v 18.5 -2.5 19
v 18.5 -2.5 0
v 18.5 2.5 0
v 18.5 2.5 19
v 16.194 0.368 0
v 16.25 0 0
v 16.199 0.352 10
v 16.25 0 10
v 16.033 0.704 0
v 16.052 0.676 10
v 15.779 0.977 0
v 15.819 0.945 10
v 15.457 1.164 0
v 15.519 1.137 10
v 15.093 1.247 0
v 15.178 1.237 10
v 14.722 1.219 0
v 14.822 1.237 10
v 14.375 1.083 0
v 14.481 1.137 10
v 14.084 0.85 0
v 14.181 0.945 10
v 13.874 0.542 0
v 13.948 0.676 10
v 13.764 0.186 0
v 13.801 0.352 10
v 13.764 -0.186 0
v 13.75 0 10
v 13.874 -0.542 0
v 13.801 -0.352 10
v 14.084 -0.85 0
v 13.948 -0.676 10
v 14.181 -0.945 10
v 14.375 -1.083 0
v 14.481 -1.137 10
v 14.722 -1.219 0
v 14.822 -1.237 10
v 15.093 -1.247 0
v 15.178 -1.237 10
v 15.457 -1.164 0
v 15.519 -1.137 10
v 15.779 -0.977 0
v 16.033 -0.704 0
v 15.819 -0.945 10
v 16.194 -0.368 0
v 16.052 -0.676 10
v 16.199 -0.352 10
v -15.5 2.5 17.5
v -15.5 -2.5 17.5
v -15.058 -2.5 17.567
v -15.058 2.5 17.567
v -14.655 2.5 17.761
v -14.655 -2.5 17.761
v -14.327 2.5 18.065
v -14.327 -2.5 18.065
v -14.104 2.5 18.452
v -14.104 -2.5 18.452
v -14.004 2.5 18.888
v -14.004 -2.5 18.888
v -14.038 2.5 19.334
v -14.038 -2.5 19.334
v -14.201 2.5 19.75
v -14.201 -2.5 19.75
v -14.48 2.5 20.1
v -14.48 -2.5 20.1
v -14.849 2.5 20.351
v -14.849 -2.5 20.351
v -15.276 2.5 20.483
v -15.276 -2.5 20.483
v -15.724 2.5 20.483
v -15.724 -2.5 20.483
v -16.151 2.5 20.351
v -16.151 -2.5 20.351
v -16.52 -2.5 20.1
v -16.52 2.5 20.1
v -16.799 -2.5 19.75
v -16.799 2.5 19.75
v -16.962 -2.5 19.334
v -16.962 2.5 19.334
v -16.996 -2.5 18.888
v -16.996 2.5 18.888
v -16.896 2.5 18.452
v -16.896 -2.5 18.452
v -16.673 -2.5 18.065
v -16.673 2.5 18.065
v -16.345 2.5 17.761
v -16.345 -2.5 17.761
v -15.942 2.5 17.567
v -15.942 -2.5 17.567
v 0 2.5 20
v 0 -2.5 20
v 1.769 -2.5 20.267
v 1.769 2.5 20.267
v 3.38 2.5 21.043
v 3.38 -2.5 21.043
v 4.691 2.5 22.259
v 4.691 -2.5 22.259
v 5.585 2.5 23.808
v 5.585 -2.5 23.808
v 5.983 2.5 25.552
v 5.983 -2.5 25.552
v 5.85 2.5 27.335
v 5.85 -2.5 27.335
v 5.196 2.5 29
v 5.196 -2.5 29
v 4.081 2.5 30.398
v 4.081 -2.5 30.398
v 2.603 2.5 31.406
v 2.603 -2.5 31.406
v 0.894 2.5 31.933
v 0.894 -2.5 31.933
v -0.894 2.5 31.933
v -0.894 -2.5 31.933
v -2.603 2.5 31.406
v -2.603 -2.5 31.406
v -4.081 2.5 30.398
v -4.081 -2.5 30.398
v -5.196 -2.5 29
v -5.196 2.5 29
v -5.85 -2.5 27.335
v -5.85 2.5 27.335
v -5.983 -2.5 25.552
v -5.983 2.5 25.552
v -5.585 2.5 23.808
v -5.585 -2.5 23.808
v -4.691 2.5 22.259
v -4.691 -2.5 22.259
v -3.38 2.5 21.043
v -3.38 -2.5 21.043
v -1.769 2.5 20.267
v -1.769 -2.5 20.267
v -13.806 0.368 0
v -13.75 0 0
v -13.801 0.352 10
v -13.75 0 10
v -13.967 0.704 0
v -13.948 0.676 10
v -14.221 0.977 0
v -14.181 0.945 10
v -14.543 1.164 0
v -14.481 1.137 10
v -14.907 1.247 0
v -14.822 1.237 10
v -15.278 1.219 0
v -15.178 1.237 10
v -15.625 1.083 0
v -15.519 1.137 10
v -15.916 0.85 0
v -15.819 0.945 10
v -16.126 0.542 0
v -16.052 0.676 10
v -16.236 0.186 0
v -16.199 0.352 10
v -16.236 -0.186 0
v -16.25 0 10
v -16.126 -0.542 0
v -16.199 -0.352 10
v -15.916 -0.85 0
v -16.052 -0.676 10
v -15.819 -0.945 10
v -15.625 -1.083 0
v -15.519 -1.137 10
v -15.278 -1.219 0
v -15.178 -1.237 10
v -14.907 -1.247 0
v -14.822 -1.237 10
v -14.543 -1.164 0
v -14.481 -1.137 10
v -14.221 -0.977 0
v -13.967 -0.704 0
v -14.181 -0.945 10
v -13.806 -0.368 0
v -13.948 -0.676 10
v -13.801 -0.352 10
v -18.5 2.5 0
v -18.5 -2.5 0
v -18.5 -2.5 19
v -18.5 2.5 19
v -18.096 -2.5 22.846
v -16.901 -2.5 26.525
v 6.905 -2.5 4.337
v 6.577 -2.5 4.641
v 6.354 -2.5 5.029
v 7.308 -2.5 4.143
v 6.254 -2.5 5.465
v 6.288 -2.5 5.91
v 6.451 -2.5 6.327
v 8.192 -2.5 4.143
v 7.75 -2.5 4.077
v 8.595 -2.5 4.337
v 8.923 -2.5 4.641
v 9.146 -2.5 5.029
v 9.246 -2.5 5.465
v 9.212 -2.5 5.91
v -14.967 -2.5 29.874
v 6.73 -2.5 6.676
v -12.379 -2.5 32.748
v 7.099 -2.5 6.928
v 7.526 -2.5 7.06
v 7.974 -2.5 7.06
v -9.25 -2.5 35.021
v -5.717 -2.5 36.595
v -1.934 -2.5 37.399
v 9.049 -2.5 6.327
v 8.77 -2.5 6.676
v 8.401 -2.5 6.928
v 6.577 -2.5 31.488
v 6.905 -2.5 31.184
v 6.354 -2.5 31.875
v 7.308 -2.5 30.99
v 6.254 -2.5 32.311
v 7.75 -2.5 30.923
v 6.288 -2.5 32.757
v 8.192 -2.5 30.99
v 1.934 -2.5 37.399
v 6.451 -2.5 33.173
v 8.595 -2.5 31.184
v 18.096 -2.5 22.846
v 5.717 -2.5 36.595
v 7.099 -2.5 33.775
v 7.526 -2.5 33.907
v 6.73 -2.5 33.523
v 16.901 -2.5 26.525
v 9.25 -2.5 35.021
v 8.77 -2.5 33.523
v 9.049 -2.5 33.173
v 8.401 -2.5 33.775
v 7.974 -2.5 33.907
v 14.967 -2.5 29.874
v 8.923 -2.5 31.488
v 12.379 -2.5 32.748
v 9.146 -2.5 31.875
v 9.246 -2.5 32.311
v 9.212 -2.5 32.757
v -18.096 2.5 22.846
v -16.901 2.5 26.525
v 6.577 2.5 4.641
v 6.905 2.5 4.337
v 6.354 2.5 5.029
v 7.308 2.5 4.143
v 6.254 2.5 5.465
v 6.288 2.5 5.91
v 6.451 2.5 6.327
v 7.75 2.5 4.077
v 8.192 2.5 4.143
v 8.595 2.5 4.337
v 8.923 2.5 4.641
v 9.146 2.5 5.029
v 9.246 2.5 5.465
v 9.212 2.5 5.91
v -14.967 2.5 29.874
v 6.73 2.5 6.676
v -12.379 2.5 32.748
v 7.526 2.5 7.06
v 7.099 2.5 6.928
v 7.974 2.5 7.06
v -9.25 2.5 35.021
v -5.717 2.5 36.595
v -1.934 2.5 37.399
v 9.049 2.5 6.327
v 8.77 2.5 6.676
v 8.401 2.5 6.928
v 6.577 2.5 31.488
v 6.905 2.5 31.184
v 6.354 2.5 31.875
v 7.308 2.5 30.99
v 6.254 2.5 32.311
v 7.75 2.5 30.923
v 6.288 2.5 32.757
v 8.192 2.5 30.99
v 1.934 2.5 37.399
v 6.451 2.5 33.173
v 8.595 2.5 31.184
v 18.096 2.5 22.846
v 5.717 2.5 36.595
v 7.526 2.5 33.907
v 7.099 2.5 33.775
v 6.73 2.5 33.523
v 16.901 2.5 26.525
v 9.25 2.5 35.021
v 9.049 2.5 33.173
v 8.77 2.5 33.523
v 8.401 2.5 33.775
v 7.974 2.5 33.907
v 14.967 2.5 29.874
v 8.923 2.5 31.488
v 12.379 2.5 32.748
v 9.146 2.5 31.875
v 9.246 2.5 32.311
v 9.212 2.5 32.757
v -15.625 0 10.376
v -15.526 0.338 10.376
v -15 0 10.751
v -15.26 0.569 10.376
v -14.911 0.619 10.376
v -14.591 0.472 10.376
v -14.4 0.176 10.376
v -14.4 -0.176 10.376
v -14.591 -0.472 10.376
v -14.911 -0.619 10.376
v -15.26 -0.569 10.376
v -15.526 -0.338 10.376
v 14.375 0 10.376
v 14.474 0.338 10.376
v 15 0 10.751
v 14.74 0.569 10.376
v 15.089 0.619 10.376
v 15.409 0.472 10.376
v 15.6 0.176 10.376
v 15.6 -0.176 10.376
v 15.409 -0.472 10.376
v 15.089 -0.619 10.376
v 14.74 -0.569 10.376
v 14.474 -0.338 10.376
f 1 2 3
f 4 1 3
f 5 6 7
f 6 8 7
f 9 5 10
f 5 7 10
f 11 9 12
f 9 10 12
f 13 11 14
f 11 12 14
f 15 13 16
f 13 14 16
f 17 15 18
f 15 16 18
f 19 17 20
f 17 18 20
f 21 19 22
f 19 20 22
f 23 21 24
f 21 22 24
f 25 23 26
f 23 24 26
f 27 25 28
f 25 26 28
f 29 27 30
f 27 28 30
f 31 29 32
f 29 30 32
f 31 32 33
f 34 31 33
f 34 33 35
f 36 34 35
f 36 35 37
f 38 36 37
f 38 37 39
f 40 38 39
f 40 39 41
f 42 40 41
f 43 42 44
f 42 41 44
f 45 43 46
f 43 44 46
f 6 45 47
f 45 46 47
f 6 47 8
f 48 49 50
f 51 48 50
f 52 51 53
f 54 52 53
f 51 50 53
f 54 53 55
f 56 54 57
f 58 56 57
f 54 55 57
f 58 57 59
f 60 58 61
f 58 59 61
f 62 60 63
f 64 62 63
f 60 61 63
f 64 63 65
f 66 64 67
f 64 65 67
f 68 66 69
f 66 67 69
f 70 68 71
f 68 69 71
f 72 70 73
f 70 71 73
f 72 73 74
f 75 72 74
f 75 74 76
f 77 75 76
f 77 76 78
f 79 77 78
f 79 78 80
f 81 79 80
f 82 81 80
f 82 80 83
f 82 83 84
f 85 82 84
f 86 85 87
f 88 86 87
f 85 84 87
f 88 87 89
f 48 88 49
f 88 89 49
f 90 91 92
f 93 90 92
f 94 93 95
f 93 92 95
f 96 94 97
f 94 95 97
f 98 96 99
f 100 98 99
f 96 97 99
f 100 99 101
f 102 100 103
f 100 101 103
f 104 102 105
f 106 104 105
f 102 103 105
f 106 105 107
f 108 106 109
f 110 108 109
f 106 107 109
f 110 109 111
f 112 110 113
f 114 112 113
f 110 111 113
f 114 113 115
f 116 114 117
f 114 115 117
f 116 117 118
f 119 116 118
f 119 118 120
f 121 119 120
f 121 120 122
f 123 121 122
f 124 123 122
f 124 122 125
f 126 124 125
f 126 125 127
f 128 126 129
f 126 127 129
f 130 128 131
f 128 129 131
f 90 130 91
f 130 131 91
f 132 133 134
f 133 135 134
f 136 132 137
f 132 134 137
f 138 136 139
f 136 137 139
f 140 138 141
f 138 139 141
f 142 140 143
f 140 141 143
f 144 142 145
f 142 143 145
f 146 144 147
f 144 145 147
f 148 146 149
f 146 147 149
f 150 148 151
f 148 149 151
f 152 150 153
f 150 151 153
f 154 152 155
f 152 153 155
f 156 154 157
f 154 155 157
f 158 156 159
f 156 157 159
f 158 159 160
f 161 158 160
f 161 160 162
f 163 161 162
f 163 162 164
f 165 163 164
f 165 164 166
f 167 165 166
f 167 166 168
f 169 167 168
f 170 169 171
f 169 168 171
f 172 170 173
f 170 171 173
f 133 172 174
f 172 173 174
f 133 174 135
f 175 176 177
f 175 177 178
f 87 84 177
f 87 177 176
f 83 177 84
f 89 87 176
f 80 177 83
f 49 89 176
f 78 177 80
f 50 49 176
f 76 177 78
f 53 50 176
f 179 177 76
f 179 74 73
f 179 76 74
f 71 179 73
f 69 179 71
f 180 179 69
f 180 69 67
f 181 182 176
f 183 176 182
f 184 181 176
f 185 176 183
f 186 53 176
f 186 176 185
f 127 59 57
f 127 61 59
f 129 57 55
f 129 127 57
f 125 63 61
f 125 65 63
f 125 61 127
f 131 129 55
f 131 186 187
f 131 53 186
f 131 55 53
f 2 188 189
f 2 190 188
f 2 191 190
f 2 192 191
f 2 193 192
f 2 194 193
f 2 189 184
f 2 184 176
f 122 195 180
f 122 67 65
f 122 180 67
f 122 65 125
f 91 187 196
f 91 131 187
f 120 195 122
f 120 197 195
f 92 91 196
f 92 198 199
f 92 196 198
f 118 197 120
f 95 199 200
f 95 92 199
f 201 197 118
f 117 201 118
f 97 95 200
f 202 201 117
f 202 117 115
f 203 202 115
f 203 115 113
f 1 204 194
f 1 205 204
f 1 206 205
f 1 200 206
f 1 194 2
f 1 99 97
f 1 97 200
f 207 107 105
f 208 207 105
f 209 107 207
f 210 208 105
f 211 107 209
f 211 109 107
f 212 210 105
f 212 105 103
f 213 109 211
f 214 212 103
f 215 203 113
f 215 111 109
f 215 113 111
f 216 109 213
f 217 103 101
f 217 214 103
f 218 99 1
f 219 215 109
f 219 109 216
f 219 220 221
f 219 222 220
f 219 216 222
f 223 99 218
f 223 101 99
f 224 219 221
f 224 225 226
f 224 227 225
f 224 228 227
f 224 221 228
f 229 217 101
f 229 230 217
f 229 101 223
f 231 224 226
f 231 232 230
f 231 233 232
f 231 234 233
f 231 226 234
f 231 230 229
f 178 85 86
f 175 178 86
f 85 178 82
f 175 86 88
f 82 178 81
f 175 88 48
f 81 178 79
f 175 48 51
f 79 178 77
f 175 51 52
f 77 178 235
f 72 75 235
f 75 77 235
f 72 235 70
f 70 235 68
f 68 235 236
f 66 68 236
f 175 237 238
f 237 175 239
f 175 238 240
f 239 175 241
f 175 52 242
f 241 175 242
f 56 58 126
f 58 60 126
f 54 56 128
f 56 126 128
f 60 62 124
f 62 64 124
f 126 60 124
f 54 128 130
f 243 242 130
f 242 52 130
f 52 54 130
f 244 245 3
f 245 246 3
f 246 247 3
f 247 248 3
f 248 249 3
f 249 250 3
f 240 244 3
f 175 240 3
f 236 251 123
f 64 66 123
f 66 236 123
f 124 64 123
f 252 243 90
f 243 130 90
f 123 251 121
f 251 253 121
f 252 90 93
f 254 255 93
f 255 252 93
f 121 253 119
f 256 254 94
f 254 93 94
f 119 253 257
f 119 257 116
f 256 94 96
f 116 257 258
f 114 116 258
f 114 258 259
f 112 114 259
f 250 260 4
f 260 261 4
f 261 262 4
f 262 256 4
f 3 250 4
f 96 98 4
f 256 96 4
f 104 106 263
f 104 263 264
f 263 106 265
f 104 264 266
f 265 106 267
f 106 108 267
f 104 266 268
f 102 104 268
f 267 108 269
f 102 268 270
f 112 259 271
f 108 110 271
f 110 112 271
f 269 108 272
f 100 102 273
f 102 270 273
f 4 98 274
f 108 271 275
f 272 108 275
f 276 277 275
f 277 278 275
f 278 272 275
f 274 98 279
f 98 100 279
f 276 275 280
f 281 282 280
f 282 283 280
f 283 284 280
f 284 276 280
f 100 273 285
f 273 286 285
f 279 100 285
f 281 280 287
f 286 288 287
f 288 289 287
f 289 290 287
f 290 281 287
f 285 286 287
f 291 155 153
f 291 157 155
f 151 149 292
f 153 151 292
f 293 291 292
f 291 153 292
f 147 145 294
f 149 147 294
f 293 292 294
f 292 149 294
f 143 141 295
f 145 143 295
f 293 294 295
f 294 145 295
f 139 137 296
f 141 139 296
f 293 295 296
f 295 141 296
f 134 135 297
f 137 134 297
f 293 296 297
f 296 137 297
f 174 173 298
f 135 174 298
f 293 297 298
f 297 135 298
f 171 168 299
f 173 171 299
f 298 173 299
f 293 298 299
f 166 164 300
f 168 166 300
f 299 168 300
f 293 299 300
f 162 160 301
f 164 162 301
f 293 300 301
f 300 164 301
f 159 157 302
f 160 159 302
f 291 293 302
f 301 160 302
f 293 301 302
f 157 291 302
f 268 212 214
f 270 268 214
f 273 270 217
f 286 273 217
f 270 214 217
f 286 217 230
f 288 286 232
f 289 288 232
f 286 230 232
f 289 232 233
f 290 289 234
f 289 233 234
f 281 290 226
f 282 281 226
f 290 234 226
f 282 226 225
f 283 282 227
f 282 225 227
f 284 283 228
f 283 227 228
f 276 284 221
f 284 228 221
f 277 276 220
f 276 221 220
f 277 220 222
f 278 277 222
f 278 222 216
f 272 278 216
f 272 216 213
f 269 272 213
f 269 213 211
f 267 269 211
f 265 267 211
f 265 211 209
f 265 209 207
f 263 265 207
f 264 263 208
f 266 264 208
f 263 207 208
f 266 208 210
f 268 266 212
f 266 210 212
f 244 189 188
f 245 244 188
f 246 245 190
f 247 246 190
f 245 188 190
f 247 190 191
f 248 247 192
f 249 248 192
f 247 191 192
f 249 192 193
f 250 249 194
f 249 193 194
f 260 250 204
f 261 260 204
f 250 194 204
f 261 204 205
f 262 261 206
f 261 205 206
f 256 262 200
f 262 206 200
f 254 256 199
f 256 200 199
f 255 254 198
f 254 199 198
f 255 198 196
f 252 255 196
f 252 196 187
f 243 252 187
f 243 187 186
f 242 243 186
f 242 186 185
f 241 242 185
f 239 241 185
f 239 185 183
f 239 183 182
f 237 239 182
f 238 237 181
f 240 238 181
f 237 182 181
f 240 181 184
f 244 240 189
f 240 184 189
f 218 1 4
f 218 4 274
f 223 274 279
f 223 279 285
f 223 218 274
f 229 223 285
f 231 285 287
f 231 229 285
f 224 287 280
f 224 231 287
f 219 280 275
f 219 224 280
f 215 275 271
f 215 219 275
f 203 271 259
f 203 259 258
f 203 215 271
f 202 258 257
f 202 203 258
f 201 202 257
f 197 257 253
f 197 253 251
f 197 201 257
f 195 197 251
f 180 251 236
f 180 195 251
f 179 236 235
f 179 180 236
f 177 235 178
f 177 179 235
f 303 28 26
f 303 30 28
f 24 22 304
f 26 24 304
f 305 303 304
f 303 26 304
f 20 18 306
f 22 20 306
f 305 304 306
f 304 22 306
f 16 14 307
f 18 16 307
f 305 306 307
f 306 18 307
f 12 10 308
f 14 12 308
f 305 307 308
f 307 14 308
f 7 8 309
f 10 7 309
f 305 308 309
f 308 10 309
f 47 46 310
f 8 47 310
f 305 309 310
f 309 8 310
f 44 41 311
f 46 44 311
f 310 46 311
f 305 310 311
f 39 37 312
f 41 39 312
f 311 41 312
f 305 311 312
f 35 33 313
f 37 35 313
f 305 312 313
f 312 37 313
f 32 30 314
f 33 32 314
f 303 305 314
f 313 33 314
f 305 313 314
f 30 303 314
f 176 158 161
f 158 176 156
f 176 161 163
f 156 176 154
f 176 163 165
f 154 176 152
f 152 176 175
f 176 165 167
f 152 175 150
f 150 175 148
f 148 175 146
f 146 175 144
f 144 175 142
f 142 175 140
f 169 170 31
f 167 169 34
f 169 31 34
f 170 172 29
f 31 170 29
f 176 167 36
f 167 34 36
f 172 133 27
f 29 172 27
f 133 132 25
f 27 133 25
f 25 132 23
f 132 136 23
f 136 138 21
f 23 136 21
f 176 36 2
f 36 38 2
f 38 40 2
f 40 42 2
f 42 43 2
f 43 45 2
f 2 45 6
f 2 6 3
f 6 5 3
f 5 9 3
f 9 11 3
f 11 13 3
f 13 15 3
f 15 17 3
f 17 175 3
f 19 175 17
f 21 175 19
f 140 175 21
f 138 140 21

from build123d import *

# Parameters (mm, degrees)
SKETCH_1_W          = 37
SKETCH_1_H          = 5
EXTRUDE_1_DEPTH     = 19
SKETCH_2_R          = 18.5
EXTRUDE_2_DEPTH     = 5
SKETCH_3_R          = 6
SKETCH_3_R_2        = 1.5
CUT_EXTRUDE_1_DEPTH = 5
M3X0_5_1_D          = 2.5
M3X0_5_1_DEPTH      = 10
M3X0_5_1_TIP        = 0.751075774


with BuildPart() as part:
    # ｽｹｯﾁ1 → ﾎﾞｽ - 押し出し1 (new body)
    with BuildSketch(Plane.XY):
        Rectangle(SKETCH_1_W, SKETCH_1_H)
    extrude(amount=EXTRUDE_1_DEPTH)

    # ｽｹｯﾁ2 → ﾎﾞｽ - 押し出し2 (add)
    with BuildSketch(Plane.XZ.offset(2.5)):
        with Locations((0, 19)):
            Circle(SKETCH_2_R)
    extrude(amount=-EXTRUDE_2_DEPTH)

    # ｽｹｯﾁ3 → ｶｯﾄ - 押し出し1 (cut)
    with BuildSketch(Plane.XZ.offset(2.5)):
        with Locations(Location((0, 26, 0), (0, 0, 270))):  # turned: the seam where the file's is
            Circle(SKETCH_3_R)
        with Locations(Location((-15.5, 19, 0), (0, 0, 270))):  # turned: the seam where the file's is
            Circle(SKETCH_3_R_2)
        with Locations(Location((7.75, 5.576606241, 0), (0, 0, 270))):  # turned: the seam where the file's is
            Circle(SKETCH_3_R_2)
        with Locations(Location((7.75, 32.423393759, 0), (0, 0, 270))):  # turned: the seam where the file's is
            Circle(SKETCH_3_R_2)
    extrude(amount=-CUT_EXTRUDE_1_DEPTH, mode=Mode.SUBTRACT)

    # M3x0.5 ねじ穴1
    with Locations(Plane(origin=(0, 0, 0), x_dir=(-1, 0, 0), z_dir=(0, 0, -1))):
        with Locations((15, 0), (-15, 0)):
            Hole(M3X0_5_1_D / 2, depth=M3X0_5_1_DEPTH)
            with Locations((0, 0, -(M3X0_5_1_DEPTH + M3X0_5_1_TIP / 2))):  # 118° drill point
                Cone(0, M3X0_5_1_D / 2, M3X0_5_1_TIP, mode=Mode.SUBTRACT)


solid = part.part
